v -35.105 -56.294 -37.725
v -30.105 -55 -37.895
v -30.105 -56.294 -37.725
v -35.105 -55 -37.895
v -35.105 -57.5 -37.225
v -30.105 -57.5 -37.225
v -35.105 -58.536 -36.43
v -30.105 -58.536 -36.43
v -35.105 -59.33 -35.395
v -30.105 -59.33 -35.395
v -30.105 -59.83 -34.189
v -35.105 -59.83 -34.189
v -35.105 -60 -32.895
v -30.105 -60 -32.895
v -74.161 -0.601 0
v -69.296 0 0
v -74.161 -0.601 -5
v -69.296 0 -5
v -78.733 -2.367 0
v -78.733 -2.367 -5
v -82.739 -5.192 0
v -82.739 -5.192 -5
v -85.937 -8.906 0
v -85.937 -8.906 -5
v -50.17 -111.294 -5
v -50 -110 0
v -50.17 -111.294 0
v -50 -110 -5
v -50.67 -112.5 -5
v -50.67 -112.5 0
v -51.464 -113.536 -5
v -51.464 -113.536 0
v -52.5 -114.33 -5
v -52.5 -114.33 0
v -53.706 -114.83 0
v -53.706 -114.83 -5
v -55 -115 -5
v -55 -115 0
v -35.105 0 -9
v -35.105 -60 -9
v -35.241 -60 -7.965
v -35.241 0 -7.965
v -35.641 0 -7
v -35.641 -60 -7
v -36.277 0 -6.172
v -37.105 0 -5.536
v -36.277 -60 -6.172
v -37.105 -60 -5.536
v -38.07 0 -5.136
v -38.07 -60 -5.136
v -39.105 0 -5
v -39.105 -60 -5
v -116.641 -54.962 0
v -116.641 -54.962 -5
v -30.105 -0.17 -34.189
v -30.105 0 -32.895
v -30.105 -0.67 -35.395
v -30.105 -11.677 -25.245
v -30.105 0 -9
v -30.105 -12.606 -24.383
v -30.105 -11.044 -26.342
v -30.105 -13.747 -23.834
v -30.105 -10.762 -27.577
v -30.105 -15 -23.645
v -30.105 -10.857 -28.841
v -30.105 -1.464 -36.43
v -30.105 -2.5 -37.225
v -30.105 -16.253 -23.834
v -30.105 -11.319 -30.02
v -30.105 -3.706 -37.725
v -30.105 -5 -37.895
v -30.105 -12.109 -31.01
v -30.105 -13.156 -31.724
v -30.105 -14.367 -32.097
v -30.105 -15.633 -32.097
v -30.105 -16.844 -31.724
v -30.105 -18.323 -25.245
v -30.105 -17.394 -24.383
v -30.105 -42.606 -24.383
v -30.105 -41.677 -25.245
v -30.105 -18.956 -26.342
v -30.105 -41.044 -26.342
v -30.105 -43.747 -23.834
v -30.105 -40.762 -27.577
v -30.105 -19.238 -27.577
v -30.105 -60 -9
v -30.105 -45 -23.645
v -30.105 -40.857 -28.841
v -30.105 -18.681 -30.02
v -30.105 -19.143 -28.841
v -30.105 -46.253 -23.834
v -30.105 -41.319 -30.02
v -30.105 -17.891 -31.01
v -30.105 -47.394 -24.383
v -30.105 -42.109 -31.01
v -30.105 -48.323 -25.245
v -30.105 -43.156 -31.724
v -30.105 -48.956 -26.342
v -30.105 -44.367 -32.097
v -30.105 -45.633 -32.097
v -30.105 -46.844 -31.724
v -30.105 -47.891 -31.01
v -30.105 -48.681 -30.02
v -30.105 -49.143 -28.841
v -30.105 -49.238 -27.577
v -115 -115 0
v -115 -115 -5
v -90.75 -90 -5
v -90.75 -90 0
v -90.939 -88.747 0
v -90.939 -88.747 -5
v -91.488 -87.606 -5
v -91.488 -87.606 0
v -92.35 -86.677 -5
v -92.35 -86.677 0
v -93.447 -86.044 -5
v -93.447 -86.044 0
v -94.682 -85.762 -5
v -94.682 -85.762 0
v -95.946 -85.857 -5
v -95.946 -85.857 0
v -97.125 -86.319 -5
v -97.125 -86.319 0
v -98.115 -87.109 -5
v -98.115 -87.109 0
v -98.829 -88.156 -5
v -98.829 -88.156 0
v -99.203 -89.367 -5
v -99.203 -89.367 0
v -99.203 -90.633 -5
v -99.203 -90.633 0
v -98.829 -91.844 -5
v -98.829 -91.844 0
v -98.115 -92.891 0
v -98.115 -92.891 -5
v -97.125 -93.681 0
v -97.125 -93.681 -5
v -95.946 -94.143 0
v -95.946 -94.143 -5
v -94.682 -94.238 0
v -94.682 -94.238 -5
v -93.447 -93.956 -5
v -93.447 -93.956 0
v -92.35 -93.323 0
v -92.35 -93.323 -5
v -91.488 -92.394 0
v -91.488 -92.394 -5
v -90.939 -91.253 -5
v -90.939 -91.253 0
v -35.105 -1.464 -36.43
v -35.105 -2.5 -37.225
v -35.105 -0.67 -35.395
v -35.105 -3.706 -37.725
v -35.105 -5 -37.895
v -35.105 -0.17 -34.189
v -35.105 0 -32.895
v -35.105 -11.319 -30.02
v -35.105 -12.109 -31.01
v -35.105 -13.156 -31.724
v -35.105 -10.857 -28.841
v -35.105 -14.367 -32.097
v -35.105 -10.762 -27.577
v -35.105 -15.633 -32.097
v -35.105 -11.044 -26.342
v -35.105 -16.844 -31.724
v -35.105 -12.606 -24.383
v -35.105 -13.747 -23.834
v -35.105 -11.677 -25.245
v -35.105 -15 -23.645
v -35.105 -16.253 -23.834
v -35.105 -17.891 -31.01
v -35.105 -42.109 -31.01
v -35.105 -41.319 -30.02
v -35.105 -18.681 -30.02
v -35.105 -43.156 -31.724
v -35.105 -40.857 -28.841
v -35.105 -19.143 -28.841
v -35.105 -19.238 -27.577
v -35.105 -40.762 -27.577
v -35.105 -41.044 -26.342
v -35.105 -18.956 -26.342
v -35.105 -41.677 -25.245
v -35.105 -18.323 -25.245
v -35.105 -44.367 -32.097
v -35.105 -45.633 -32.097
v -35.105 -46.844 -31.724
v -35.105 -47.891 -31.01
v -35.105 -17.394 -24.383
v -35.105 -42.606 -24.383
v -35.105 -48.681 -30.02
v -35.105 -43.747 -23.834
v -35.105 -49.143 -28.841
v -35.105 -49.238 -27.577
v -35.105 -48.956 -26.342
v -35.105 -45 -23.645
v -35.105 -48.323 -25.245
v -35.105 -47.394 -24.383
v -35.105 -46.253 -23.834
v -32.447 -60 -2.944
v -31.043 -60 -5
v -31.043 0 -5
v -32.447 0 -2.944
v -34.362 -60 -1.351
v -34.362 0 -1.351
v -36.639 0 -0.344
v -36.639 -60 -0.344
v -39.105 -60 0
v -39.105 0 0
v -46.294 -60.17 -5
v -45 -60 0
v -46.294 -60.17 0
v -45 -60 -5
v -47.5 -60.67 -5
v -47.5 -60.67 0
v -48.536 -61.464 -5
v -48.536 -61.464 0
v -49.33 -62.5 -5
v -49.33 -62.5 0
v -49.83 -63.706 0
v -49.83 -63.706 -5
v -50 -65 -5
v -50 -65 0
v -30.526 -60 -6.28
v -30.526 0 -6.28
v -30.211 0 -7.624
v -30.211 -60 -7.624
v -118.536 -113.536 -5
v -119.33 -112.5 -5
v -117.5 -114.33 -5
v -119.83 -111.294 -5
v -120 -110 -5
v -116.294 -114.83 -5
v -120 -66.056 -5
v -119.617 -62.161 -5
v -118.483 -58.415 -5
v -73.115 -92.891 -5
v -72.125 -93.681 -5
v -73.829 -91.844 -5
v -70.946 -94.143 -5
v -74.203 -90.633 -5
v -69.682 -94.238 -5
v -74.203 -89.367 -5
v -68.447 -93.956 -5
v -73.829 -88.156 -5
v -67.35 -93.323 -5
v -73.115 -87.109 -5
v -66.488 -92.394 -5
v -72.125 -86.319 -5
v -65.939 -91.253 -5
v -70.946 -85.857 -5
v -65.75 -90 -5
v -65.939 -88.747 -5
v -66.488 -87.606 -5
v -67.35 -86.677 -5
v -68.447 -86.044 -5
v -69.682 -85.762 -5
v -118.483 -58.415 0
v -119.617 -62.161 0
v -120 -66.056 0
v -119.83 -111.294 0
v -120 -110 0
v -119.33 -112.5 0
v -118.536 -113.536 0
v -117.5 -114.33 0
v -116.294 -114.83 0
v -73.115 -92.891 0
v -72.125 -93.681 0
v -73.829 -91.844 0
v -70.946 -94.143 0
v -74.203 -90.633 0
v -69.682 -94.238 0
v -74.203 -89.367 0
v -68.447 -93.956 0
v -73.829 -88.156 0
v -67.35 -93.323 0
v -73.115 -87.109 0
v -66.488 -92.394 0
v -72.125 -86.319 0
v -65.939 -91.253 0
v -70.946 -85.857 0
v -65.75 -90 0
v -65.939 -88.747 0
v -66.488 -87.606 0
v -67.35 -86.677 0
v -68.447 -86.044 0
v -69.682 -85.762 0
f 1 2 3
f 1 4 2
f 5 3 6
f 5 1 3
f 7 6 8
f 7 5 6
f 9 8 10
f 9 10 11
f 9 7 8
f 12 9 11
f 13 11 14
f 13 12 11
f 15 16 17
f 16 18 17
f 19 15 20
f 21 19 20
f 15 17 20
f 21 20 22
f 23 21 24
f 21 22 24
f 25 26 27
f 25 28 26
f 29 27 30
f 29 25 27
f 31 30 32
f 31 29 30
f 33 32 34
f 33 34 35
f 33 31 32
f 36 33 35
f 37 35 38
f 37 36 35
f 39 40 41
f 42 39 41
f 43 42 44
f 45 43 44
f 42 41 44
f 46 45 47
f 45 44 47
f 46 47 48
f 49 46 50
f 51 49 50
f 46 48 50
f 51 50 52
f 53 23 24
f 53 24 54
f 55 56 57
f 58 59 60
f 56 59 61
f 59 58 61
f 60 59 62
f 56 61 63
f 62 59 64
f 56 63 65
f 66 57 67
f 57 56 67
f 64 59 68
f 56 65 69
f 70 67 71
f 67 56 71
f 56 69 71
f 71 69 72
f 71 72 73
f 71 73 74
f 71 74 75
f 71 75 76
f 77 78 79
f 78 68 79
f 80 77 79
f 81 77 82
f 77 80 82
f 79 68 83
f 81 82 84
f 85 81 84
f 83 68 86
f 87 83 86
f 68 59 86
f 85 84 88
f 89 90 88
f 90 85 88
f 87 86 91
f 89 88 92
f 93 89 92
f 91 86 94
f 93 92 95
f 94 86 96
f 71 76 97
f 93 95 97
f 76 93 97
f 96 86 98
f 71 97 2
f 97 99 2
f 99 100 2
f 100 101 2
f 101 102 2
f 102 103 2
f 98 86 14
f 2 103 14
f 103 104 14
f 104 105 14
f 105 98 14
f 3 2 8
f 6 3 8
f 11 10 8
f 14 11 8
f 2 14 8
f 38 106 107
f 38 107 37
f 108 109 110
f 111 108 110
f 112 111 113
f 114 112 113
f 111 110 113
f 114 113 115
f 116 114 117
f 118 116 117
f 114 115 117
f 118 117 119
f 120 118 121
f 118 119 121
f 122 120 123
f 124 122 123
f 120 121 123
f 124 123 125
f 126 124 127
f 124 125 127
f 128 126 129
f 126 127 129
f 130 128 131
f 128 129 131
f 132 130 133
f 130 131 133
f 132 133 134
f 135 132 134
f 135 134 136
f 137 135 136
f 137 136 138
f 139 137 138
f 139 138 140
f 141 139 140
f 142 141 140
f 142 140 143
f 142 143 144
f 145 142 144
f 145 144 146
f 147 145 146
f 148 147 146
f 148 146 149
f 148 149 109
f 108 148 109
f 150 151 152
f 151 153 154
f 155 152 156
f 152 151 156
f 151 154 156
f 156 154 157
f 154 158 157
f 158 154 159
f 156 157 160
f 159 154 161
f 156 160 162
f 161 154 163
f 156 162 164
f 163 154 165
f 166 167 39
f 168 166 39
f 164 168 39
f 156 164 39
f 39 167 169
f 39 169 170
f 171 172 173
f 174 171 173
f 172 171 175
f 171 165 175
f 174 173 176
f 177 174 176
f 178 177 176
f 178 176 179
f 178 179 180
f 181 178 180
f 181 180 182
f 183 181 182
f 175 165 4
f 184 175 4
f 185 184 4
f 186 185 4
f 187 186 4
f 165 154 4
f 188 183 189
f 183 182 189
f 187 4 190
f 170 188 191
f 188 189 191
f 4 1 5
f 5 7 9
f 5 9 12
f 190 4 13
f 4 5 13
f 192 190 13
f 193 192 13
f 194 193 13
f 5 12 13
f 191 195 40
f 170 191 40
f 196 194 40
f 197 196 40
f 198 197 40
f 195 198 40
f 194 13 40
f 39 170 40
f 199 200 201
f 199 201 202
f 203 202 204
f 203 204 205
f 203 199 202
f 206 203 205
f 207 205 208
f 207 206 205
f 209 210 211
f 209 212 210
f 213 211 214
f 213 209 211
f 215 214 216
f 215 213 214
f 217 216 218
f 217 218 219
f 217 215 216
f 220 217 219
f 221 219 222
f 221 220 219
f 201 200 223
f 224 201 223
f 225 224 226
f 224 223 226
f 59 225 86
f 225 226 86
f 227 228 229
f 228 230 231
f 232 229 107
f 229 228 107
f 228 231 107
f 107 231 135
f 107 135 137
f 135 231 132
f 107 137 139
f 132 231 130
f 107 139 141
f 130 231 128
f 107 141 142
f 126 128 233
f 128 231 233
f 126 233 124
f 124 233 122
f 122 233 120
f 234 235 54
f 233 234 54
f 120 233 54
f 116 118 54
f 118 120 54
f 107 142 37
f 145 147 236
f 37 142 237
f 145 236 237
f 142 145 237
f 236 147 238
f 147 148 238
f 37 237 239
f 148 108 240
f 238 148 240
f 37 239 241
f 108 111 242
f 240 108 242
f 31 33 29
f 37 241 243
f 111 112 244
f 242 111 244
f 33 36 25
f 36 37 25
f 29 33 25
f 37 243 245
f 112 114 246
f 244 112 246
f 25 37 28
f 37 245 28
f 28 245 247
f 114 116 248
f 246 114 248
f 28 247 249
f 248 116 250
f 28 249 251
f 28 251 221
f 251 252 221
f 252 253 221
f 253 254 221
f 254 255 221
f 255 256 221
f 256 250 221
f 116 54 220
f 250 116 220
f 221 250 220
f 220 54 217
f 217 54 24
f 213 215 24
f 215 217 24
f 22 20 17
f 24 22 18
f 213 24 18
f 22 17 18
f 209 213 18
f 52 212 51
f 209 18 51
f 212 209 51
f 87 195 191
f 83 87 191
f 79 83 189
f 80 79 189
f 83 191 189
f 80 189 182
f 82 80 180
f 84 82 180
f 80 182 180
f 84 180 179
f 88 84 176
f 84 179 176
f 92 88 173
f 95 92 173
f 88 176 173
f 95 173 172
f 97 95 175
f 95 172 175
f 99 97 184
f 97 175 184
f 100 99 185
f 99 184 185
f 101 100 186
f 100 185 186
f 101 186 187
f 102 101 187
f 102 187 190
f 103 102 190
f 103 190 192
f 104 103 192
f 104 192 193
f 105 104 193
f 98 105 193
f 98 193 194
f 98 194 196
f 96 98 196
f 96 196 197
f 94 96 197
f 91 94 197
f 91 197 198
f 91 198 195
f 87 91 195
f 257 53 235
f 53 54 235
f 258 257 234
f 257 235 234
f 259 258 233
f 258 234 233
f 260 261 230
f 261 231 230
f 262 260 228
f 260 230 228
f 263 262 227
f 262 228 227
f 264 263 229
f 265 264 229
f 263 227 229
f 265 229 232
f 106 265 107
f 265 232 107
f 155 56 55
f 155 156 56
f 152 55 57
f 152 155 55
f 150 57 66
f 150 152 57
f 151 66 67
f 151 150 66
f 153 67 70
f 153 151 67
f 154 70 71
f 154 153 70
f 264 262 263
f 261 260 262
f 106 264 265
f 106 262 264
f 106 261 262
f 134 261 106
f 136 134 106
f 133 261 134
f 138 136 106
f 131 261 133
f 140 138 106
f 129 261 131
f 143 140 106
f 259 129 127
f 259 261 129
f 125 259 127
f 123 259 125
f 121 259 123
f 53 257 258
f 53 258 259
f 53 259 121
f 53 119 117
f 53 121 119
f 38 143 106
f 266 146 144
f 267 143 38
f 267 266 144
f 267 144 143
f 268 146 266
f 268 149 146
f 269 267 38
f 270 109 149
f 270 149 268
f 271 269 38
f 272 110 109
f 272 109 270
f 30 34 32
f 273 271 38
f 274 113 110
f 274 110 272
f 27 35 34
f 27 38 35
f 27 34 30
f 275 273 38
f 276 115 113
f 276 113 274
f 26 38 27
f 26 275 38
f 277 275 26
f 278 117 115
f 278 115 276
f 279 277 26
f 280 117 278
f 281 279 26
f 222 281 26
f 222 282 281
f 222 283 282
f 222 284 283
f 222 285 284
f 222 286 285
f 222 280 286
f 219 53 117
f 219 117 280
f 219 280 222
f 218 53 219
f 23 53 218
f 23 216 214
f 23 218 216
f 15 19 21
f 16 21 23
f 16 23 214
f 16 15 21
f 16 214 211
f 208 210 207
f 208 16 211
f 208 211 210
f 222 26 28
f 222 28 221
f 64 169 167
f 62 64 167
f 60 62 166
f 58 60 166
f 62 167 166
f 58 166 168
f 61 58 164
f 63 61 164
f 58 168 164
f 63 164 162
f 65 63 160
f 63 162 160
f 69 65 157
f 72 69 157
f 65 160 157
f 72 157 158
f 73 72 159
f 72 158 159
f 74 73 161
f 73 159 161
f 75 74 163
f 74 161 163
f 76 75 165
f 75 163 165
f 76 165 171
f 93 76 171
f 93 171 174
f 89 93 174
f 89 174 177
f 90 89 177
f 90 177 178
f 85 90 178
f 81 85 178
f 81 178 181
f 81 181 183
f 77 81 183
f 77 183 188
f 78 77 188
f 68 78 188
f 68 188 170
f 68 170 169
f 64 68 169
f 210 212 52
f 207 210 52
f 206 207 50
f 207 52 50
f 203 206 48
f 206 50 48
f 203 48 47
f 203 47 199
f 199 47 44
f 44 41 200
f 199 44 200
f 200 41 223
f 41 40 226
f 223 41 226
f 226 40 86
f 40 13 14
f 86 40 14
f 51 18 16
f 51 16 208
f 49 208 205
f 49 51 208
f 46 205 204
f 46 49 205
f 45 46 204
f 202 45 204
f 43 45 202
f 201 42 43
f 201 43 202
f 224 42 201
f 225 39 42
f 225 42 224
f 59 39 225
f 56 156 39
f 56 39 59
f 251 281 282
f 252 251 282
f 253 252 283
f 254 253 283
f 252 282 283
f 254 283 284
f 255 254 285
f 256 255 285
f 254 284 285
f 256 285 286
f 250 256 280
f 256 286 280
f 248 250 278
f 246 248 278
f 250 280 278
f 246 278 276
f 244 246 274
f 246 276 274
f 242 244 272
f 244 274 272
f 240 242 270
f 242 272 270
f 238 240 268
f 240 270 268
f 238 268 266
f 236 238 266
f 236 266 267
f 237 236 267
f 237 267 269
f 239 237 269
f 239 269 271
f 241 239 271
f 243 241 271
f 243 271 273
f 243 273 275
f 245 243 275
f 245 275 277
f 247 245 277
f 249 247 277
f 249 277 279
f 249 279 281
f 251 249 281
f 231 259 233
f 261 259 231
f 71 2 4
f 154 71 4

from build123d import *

# Parameters (mm, degrees)
TABAN_FLAN_1_DEPTH     = 5
IZGIDEN_START          = -60
IZGIDEN_B_KME2_DEPTH   = 60
IZGIDEN_B_KME2_2_DEPTH = 60
IZIM8_R                = 4.25
KES_EKSTR_ZYON1_DEPTH  = 10
RADYUS1_R              = 20
RADYUS2_R              = 5
IZIM9_R                = 4.25
KES_EKSTR_ZYON2_DEPTH  = 19


# Read off the part's stored shape, not the designer's step: Çizgiden Bükme2
# Sheet-metal steps are written as plain solids
with BuildPart() as part:
    # Çizim1 → Taban-Flanş1 (new body)
    with BuildSketch(Plane.XY):
        Polygon((0, 0), (-80, 0), (-120, -60), (-120, -115), (-50, -115), (-50, -60), (0, -60), align=None)
    extrude(amount=-TABAN_FLAN_1_DEPTH)

    # Çizgiden Bükme2 outline → Çizgiden Bükme2 (cut)
    with BuildSketch(Plane(origin=(0, 0, 0), x_dir=(1, 0, 0), z_dir=(0, 1, 0)).offset(IZGIDEN_START)):
        with BuildLine():
            Line((0, 5), (-31.042830313, 5))
            ThreePointArc((-31.042830313, 5), (-34.361671571, 1.351470729), (-39.105088062, 0))
            Line((-39.105088062, 0), (0, 0))
            Line((0, 0), (0, 5))
        make_face()
    extrude(amount=IZGIDEN_B_KME2_DEPTH, mode=Mode.SUBTRACT)

    # izgiden B_kme2 2 outline → izgiden B_kme2 2 (add)
    with BuildSketch(Plane(origin=(0, 0, 0), x_dir=(1, 0, 0), z_dir=(0, 1, 0)).offset(IZGIDEN_START)):
        with BuildLine():
            Line((-30.105088062, 37.894911938), (-35.105088062, 37.894911938))
            Line((-35.105088062, 37.894911938), (-35.105088062, 9))
            ThreePointArc((-35.105088062, 9), (-36.276660937, 6.171572875), (-39.105088062, 5))
            Line((-39.105088062, 5), (-31.042830313, 5))
            ThreePointArc((-31.042830313, 5), (-30.342659182, 6.945775053), (-30.105088062, 9))
            Line((-30.105088062, 9), (-30.105088062, 37.894911938))
        make_face()
    extrude(amount=IZGIDEN_B_KME2_2_DEPTH)

    # Çizim8 → Kes-Ekstrüzyon1 (cut)
    with BuildSketch(Plane.XY):
        with Locations((-70, -90)):
            Circle(IZIM8_R)
        with Locations((-95, -90)):
            Circle(IZIM8_R)
    extrude(amount=-KES_EKSTR_ZYON1_DEPTH, mode=Mode.SUBTRACT)

    # Radyus1
    radyus1_edges = [part.edges().sort_by_distance(p)[0] for p in [
        (-120, -60, -2.5),
        (-80, 0, -2.5),
    ]]
    fillet(radyus1_edges, radius=RADYUS1_R)

    # Radyus2
    radyus2_edges = [part.edges().sort_by_distance(p)[0] for p in [
        (-32.605088062, -60, -37.894911938),
        (-32.605088062, 0, -37.894911938),
        (-120, -115, -2.5),
        (-50, -115, -2.5),
        (-50, -60, -2.5),
    ]]
    fillet(radyus2_edges, radius=RADYUS2_R)

    # Çizim9 → Kes-Ekstrüzyon2 (cut)
    with BuildSketch(Plane.ZY.offset(35.105088062)):
        with Locations((-27.894911938, -15)):
            Circle(IZIM9_R)
        with Locations((-27.894911938, -45)):
            Circle(IZIM9_R)
    extrude(amount=-KES_EKSTR_ZYON2_DEPTH, mode=Mode.SUBTRACT)


solid = part.part
